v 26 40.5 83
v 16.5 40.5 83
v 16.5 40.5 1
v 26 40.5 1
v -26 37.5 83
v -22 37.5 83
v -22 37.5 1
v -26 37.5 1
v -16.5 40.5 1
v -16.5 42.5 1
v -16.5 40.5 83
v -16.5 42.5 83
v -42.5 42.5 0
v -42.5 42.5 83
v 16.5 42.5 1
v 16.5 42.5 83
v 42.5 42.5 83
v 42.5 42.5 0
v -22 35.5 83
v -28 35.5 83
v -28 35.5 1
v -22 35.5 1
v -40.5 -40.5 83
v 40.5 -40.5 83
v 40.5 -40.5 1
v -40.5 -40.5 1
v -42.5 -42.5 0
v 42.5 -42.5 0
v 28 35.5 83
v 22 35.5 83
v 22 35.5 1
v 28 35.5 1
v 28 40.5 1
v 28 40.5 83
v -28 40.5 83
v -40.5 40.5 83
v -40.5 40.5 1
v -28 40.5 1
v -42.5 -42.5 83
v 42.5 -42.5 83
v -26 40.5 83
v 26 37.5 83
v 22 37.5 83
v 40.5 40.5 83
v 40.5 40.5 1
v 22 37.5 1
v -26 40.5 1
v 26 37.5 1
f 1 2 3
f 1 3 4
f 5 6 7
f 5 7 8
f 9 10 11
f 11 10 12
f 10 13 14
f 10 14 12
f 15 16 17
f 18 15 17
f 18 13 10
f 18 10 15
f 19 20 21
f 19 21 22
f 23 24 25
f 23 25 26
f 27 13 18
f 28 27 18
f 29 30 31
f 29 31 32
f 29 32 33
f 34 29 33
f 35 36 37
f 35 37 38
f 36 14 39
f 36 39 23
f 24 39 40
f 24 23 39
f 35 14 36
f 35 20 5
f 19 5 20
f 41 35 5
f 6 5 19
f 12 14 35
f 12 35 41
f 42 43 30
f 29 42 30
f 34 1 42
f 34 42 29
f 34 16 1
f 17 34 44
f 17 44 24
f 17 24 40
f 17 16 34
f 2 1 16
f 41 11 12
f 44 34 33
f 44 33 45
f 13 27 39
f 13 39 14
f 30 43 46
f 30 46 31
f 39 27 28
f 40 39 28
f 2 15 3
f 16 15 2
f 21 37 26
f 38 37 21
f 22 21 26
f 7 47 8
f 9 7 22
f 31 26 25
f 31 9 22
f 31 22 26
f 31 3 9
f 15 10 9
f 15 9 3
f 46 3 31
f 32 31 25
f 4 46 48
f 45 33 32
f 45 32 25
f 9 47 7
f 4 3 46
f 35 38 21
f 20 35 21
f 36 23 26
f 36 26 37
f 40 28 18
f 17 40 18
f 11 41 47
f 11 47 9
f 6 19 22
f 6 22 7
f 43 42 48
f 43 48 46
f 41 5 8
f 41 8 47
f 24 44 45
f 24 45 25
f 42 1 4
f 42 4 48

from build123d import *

# Parameters (mm, degrees)
SKETCH_W        = 85
SKETCH_H        = 85
PAD_DEPTH       = 83
POCKET_DEPTH    = 82
SKETCH002_W     = 33
SKETCH002_H     = 82
POCKET001_DEPTH = 5


with BuildPart() as part:
    # Sketch → Pad (new body)
    with BuildSketch(Plane.XY):
        Rectangle(SKETCH_W, SKETCH_H)
    extrude(amount=PAD_DEPTH)

    # Sketch001 (on DatumPlane) → Pocket (cut)
    with BuildSketch(Plane(origin=(0, 0, 83), x_dir=(1, 0, 0), z_dir=(0, 0, -1))):
        Polygon((-40.5, 40.5), (-40.5, -40.5), (-28, -40.5), (-28, -35.5), (-22, -35.5), (-22, -37.5), (-26, -37.5), (-26, -40.5), (26, -40.5), (26, -37.5), (22, -37.5), (22, -35.5), (28, -35.5), (28, -40.5), (40.5, -40.5), (40.5, 40.5), align=None)
    extrude(amount=POCKET_DEPTH, mode=Mode.SUBTRACT)

    # Sketch002 (on DatumPlane) → Pocket001 (cut)
    with BuildSketch(Plane.XZ.offset(-42.5)):
        with Locations((0, 42)):
            Rectangle(SKETCH002_W, SKETCH002_H)
    extrude(amount=POCKET001_DEPTH, mode=Mode.SUBTRACT)


solid = part.part
